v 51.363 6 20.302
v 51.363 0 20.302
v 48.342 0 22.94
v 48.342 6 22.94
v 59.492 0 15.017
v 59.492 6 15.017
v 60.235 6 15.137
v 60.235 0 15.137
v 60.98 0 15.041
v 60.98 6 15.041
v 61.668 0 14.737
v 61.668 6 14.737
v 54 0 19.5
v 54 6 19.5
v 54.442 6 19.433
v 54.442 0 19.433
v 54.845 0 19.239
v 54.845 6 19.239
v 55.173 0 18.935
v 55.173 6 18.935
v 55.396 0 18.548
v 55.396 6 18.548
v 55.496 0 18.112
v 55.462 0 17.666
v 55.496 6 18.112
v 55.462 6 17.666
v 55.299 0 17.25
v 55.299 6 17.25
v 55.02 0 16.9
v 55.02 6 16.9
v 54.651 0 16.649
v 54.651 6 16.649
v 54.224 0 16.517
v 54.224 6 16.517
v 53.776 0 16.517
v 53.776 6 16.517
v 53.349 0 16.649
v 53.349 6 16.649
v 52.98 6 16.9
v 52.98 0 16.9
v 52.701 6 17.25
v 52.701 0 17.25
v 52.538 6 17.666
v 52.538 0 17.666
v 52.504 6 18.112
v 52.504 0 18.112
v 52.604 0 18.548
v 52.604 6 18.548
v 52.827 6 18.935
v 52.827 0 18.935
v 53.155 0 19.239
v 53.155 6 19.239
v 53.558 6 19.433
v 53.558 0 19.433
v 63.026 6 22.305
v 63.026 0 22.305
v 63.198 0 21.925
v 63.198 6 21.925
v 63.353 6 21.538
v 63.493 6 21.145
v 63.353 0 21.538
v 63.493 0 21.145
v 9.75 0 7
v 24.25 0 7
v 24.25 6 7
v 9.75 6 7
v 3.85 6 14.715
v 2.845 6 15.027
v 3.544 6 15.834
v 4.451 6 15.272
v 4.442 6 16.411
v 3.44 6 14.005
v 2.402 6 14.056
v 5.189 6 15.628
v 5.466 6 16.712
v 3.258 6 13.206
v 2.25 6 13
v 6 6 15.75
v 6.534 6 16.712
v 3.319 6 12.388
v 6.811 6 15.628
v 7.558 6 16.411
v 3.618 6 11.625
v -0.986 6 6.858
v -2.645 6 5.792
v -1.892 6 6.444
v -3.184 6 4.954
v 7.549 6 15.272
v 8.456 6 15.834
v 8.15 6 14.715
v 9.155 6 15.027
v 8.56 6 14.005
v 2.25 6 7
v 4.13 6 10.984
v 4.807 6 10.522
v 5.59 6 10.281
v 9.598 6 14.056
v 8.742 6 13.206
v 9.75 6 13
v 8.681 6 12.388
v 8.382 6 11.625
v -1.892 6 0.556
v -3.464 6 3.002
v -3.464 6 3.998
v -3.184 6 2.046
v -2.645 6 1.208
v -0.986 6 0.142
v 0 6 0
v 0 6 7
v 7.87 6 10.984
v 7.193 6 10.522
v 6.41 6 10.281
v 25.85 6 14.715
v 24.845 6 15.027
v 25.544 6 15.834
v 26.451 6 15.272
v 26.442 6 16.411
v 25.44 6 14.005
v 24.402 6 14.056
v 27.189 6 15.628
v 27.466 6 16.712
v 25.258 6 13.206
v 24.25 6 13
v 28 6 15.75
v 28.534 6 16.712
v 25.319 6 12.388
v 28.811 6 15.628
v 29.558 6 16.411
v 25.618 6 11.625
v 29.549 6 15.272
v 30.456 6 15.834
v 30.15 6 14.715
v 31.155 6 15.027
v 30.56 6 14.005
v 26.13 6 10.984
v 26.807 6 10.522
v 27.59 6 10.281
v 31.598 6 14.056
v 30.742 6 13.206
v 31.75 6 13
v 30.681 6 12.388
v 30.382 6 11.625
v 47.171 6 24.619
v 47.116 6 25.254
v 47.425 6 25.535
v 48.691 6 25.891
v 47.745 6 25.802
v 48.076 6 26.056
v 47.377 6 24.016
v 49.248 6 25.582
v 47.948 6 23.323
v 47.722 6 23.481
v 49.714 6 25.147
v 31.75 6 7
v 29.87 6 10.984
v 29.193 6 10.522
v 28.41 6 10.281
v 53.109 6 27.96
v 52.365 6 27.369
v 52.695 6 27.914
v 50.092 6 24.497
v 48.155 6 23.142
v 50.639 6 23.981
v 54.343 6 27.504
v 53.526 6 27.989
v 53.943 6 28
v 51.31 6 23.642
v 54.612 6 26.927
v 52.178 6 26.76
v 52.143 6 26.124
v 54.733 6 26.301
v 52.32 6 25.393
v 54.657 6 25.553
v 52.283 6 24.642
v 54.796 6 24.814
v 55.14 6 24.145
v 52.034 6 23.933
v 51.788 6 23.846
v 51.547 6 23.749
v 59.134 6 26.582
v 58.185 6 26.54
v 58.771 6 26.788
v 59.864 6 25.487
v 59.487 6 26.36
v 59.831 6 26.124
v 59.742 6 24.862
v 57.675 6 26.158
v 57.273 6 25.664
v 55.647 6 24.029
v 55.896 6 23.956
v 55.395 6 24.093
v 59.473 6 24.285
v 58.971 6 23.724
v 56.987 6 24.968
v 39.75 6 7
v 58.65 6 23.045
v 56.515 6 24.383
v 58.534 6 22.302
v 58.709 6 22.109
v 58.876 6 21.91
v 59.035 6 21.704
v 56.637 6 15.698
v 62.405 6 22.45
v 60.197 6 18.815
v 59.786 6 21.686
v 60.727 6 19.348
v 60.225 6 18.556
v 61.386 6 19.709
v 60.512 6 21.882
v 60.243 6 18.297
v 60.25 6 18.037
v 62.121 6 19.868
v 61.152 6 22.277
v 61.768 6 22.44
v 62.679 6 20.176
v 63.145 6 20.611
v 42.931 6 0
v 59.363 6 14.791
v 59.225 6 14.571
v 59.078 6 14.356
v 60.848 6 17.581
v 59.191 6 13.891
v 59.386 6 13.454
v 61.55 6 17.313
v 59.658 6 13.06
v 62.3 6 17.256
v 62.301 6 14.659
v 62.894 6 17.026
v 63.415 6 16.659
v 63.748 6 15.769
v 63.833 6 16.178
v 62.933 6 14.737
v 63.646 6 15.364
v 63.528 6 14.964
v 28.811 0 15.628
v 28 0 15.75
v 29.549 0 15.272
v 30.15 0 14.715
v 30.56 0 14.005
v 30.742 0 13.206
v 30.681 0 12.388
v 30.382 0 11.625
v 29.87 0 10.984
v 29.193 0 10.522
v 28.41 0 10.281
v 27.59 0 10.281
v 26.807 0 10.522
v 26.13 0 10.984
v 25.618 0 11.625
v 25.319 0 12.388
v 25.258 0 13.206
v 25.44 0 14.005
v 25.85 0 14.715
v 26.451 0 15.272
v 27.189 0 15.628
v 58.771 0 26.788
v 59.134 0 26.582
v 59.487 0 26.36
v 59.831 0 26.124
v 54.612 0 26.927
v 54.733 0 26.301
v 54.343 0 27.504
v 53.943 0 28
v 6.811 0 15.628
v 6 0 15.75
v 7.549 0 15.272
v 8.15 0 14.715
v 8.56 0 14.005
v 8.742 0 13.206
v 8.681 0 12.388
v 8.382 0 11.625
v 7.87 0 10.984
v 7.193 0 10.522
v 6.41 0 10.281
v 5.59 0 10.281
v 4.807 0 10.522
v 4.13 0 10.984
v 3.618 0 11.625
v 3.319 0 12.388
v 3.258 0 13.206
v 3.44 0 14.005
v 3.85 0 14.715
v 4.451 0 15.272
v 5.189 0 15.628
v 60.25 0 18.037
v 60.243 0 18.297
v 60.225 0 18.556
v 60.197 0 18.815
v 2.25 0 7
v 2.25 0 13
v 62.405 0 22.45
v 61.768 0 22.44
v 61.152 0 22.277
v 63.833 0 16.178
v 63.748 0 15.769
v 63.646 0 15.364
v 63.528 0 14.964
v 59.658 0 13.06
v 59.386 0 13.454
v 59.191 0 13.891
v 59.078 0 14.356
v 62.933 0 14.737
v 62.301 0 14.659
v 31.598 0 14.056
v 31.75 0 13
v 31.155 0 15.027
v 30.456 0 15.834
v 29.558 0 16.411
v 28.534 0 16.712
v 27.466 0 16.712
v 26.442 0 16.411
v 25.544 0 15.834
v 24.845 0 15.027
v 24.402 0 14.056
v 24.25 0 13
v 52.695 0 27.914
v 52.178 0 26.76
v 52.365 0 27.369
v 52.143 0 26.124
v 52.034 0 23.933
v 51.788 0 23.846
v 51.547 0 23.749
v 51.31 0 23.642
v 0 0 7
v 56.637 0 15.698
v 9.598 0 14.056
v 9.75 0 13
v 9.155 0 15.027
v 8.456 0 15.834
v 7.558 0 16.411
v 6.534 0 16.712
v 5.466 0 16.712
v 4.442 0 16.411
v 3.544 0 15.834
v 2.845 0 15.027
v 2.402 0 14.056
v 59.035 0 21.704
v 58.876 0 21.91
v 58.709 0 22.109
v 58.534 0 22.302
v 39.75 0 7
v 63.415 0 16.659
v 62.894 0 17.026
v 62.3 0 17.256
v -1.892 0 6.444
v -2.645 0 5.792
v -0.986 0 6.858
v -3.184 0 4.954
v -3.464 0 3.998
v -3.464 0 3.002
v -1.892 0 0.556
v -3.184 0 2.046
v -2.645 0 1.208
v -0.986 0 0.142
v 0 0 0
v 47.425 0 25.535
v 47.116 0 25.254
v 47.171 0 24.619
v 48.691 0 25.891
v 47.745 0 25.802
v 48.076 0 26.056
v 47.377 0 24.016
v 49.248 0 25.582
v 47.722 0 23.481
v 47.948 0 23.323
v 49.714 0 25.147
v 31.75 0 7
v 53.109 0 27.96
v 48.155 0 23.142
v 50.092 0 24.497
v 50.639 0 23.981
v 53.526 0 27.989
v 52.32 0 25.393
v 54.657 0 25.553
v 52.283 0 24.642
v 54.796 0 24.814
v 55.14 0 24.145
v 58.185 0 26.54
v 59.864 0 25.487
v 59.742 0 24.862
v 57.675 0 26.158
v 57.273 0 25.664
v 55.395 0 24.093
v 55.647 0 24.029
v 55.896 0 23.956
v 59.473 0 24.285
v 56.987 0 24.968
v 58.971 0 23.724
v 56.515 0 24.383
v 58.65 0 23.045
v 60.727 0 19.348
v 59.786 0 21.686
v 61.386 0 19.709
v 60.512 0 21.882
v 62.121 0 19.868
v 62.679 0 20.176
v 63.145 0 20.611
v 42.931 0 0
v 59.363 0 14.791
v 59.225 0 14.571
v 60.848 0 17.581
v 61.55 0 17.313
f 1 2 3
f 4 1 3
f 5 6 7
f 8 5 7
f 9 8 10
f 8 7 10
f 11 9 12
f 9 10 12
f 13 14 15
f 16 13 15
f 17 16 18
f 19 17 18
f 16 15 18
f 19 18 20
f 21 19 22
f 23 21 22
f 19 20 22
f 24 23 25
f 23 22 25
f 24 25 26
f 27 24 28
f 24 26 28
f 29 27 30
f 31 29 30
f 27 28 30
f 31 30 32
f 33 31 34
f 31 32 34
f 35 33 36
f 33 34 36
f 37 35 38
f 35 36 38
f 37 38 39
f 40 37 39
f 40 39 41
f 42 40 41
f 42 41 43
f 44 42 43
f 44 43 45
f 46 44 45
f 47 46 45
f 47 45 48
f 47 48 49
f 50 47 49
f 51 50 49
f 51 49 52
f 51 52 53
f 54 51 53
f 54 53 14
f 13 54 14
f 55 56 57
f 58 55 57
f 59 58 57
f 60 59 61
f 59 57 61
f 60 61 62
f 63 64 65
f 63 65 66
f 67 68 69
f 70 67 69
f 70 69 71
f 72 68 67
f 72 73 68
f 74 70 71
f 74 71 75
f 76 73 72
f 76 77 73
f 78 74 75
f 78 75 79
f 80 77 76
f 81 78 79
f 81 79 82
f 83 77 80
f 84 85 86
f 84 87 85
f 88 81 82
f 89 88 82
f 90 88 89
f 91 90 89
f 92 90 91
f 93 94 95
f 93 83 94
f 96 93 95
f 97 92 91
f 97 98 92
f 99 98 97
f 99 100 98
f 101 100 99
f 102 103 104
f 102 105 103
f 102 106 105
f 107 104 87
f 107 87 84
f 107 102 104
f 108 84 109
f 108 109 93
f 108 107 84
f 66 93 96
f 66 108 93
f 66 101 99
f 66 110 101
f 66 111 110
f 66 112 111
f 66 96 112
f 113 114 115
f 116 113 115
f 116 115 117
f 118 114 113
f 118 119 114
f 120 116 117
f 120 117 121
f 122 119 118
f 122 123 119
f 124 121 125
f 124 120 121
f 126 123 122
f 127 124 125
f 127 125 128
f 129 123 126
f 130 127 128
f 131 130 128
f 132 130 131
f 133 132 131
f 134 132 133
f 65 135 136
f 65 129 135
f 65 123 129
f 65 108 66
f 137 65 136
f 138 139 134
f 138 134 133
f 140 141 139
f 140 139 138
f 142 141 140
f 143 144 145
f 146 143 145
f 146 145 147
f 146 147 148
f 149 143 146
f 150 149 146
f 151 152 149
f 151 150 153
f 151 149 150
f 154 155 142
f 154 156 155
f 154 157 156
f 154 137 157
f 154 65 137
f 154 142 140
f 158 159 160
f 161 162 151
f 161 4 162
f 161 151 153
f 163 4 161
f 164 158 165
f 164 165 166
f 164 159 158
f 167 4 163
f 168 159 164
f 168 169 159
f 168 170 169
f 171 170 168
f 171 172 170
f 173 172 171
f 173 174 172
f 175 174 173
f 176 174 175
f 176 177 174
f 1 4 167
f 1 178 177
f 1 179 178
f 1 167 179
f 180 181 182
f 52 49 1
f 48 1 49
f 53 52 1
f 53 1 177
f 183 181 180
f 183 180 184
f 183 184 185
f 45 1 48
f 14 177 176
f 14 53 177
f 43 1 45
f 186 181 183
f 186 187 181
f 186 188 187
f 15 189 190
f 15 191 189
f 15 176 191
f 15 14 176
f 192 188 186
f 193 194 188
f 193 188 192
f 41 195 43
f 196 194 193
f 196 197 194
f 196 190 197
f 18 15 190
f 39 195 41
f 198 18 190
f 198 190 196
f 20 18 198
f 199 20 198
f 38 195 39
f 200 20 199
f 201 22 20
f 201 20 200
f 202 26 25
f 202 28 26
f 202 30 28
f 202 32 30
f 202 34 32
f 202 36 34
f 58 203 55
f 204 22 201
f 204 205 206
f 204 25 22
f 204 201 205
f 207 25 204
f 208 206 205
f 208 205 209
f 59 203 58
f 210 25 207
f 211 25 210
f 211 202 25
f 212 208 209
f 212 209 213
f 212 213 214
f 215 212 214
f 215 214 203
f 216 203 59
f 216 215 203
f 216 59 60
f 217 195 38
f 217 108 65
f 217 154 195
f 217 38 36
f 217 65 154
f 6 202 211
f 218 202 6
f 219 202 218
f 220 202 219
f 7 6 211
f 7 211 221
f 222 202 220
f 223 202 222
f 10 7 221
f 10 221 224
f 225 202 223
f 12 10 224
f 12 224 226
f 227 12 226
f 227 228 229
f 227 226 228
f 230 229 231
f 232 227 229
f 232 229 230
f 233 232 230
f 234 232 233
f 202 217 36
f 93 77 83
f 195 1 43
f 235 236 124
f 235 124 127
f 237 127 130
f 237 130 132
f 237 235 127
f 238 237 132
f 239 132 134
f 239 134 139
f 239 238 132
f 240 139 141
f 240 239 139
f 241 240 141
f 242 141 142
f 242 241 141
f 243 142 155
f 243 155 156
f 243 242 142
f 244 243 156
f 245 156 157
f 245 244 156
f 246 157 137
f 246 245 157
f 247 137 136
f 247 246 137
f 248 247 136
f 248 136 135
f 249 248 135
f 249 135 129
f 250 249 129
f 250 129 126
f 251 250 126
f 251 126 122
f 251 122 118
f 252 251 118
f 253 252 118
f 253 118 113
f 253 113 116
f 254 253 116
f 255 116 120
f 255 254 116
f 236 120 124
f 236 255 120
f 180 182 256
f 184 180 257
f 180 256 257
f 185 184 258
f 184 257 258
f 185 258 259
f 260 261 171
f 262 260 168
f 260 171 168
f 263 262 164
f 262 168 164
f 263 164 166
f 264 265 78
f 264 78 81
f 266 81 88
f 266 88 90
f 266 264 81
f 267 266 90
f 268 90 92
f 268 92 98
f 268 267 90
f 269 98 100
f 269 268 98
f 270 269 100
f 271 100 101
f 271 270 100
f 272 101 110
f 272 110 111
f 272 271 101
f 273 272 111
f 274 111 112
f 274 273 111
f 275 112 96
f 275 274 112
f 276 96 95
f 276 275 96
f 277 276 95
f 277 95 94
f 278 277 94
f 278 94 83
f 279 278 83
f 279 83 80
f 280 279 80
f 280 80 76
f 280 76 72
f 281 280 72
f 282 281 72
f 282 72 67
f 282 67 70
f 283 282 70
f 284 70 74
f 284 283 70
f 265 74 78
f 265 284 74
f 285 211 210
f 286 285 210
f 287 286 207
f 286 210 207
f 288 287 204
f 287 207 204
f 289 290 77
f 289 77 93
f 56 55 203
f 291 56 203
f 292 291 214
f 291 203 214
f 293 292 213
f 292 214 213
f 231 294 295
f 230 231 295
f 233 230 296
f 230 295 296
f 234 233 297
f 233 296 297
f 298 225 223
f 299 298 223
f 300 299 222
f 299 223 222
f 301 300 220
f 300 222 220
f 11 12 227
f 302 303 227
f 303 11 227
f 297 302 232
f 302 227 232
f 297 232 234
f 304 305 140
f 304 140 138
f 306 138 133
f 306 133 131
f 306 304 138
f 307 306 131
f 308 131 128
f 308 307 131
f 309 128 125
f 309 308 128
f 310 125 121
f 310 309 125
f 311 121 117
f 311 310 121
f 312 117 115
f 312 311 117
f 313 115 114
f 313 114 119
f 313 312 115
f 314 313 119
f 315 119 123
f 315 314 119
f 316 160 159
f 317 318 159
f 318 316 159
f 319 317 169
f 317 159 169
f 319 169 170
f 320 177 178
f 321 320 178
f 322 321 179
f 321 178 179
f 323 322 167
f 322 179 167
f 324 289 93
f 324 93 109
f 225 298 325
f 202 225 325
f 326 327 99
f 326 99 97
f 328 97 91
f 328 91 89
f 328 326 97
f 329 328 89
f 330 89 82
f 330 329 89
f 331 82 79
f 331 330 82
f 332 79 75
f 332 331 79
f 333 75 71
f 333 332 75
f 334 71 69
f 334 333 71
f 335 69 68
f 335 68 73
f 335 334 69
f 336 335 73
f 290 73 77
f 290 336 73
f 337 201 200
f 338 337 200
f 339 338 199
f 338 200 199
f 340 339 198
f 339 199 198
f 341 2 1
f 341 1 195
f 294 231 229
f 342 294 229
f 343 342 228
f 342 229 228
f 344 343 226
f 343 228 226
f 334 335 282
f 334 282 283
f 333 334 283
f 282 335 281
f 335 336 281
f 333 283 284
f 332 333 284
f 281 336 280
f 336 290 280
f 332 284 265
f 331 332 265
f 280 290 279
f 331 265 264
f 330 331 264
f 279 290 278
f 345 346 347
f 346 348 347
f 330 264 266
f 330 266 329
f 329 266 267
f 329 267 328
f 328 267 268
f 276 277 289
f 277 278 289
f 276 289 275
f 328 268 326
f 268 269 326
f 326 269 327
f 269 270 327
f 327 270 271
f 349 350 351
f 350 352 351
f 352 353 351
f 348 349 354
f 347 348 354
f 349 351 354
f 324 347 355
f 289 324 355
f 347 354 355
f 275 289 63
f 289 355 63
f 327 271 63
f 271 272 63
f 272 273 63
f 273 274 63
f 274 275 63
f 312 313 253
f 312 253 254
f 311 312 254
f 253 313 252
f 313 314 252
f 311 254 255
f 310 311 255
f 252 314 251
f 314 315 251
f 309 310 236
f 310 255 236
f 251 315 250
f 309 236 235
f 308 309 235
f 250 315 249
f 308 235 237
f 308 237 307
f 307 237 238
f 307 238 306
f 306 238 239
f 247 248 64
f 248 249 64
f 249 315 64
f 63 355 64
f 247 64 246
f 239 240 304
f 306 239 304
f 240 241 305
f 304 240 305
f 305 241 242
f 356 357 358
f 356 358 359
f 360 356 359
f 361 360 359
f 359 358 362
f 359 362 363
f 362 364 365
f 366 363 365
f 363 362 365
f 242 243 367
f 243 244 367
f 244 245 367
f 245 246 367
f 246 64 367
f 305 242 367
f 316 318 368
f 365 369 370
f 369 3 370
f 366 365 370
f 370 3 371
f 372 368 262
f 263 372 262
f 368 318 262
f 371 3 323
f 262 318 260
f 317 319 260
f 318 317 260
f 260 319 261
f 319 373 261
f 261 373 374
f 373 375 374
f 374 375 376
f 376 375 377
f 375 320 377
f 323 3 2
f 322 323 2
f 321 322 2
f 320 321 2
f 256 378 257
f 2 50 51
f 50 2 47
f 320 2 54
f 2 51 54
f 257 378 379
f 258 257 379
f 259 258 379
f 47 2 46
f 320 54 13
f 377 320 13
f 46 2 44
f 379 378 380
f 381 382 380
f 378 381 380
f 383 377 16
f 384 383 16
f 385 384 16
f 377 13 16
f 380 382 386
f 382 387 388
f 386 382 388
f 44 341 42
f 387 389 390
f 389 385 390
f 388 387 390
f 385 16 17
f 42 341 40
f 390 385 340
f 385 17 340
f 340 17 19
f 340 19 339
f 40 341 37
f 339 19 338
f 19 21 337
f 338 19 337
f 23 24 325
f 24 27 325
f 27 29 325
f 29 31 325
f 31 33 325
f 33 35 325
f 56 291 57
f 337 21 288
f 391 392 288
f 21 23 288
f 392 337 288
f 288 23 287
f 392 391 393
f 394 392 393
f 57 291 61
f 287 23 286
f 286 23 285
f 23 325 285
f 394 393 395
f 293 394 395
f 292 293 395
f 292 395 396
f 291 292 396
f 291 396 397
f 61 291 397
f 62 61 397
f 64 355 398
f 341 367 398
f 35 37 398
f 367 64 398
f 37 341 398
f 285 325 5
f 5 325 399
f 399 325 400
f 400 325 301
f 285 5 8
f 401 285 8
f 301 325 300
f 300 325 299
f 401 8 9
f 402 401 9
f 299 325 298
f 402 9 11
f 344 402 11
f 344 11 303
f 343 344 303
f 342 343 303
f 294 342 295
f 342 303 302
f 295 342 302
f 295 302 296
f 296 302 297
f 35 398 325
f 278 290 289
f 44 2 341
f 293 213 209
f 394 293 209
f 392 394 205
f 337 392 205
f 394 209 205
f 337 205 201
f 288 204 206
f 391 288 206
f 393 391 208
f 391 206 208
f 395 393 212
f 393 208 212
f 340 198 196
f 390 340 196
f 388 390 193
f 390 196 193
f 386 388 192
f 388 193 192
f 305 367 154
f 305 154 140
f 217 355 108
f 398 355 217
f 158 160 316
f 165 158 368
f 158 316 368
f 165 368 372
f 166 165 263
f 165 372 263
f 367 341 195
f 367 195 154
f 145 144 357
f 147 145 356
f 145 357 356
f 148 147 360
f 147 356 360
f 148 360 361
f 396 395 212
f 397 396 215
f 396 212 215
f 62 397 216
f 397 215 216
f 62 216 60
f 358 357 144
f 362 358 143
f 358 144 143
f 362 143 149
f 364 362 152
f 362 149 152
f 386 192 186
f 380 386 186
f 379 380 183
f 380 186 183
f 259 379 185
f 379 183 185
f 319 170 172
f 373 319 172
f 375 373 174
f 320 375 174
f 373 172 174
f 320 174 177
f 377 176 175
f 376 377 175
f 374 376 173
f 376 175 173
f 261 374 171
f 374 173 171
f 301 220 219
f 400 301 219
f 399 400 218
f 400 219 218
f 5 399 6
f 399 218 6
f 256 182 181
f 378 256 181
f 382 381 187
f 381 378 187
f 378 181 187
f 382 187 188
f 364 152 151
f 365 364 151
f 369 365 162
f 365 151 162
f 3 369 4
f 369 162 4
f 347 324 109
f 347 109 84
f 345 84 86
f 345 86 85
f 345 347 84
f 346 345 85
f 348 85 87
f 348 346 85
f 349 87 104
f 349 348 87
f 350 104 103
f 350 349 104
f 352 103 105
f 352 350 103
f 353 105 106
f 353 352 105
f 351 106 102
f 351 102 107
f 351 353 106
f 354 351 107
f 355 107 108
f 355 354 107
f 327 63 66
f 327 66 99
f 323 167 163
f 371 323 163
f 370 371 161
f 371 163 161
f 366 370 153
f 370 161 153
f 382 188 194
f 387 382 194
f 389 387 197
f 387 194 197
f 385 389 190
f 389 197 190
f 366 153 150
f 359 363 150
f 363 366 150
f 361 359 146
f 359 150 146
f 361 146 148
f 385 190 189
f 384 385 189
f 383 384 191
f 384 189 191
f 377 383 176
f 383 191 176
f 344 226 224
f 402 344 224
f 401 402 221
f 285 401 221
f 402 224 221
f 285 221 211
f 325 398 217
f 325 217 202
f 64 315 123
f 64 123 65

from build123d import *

# Parameters (mm, degrees)
CROQUIS1_R              = 2.75
SALIENTE_EXTRUIR1_DEPTH = 6
CROQUIS2_R              = 1.5
CORTAR_EXTRUIR1_DEPTH   = 62.68062905
SALIENTE_EXTRUIR2_START = -6
SALIENTE_EXTRUIR2_DEPTH = 6
CORTAR_EXTRUIR2_DEPTH   = 71.114192572


with BuildPart() as part:
    # Croquis1 → Saliente-Extruir1 (new body)
    with BuildSketch(Plane(origin=(0, 0, 0), x_dir=(1, 0, 0), z_dir=(0, 1, 0))):
        with BuildLine():
            Line((42.930999161, 0), (56.636539912, -15.69811875))
            ThreePointArc((56.636539912, -15.69811875), (56.30188125, -20.636539912), (51.363460088, -20.30188125))
            Line((51.363460088, -20.30188125), (39.75, -7))
            Line((39.75, -7), (31.75, -7))
            Line((31.75, -7), (31.75, -13))
            ThreePointArc((31.75, -13), (28, -16.75), (24.25, -13))
            Line((24.25, -13), (24.25, -7))
            Line((24.25, -7), (9.75, -7))
            Line((9.75, -7), (9.75, -13))
            ThreePointArc((9.75, -13), (6, -16.75), (2.25, -13))
            Line((2.25, -13), (2.25, -7))
            Line((2.25, -7), (0, -7))
            ThreePointArc((0, -7), (-3.5, -3.5), (0, 0))
            Line((0, 0), (42.930999161, 0))
        make_face()
        with Locations(Location((28, -13, 0), (0, 0, 270))):
            Circle(CROQUIS1_R, mode=Mode.SUBTRACT)
        with Locations(Location((6, -13, 0), (0, 0, 270))):
            Circle(CROQUIS1_R, mode=Mode.SUBTRACT)
    extrude(amount=SALIENTE_EXTRUIR1_DEPTH)

    # Croquis2 → Cortar-Extruir1 (cut, through all)
    with BuildSketch(Plane(origin=(0, 6, 0), x_dir=(1, 0, 0), z_dir=(0, 1, 0))):
        with Locations(Location((54, -18, 0), (0, 0, 270))):
            Circle(CROQUIS2_R)
    extrude(amount=-CORTAR_EXTRUIR1_DEPTH, mode=Mode.SUBTRACT)

    # Croquis3 → Saliente-Extruir2 (add)
    with BuildSketch(Plane(origin=(0, 6, 0), x_dir=(1, 0, 0), z_dir=(0, 1, 0)).offset(SALIENTE_EXTRUIR2_START)):
        with BuildLine():
            Line((51.363460088, -20.30188125), (46.467028822, -24.576803572))
            ThreePointArc((46.467028822, -24.576803572), (60.576803572, -25.532971178), (61.532971178, -11.423196428))
            Line((61.532971178, -11.423196428), (56.636539912, -15.69811875))
            ThreePointArc((56.636539912, -15.69811875), (56.30188125, -20.636539912), (51.363460088, -20.30188125))
        make_face()
    extrude(amount=SALIENTE_EXTRUIR2_DEPTH)

    # Croquis4 → Cortar-Extruir2 (cut, through all)
    with BuildSketch(Plane(origin=(0, 6, 0), x_dir=(1, 0, 0), z_dir=(0, 1, 0))):
        with BuildLine():
            ThreePointArc((44.471919223, -21.035733308), (45.527460474, -23.311880456), (47.116349204, -25.25364403))
            ThreePointArc((47.116349204, -25.25364403), (47.255351375, -24.311140987), (47.722398468, -23.480779257))
            ThreePointArc((47.722398468, -23.480779257), (48.523826653, -22.694010434), (48.921868449, -21.643841379))
            ThreePointArc((48.921868449, -21.643841379), (48.704493345, -21.320031523), (48.507736999, -20.983294683))
            ThreePointArc((48.507736999, -20.983294683), (47.389059112, -20.884036937), (46.331721606, -21.262626046))
            ThreePointArc((46.331721606, -21.262626046), (45.380828681, -21.321245459), (44.471919223, -21.035733308))
        make_face()
        with BuildLine():
            ThreePointArc((48.075979996, -26.056425199), (50.267816532, -27.277435344), (52.694594509, -27.914429711))
            ThreePointArc((52.694594509, -27.914429711), (52.253060238, -27.070225306), (52.142834895, -26.123925161))
            ThreePointArc((52.142834895, -26.123925161), (52.328752805, -25.016348145), (52.0335015, -23.932780435))
            ThreePointArc((52.0335015, -23.932780435), (51.667310689, -23.798582639), (51.310202513, -23.641807292))
            ThreePointArc((51.310202513, -23.641807292), (50.346830851, -24.219048452), (49.713955935, -25.146820868))
            ThreePointArc((49.713955935, -25.146820868), (48.979123025, -25.753165807), (48.075979996, -26.056425199))
        make_face()
        with BuildLine():
            ThreePointArc((53.94281506, -27.999836493), (56.433739822, -27.699325259), (58.771460342, -26.788240222))
            ThreePointArc((58.771460342, -26.788240222), (57.918040714, -26.364791844), (57.272645269, -25.664007776))
            ThreePointArc((57.272645269, -25.664007776), (56.772038582, -24.658679342), (55.896270139, -23.955599013))
            ThreePointArc((55.896270139, -23.955599013), (55.521136064, -24.062272273), (55.140079244, -24.145341273))
            ThreePointArc((55.140079244, -24.145341273), (54.699989039, -25.178594837), (54.73331342, -26.30117303))
            ThreePointArc((54.73331342, -26.30117303), (54.495221721, -27.223640338), (53.94281506, -27.999836493))
        make_face()
        with BuildLine():
            ThreePointArc((59.831492828, -26.123650128), (61.670057221, -24.416402593), (63.025790501, -22.305241669))
            ThreePointArc((63.025790501, -22.305241669), (62.086462807, -22.464292206), (61.152416384, -22.276699911))
            ThreePointArc((61.152416384, -22.276699911), (60.156499839, -21.75762135), (59.034728037, -21.703581191))
            ThreePointArc((59.034728037, -21.703581191), (58.793939164, -22.010379949), (58.534484453, -22.30156376))
            ThreePointArc((58.534484453, -22.30156376), (58.785775205, -23.396161985), (59.472570103, -24.284759241))
            ThreePointArc((59.472570103, -24.284759241), (59.822162551, -25.170997759), (59.831492828, -26.123650128))
        make_face()
        with BuildLine():
            ThreePointArc((63.49273854, -21.144505527), (63.976673456, -18.682632222), (63.832575464, -16.177787128))
            ThreePointArc((63.832575464, -16.177787128), (63.166130956, -16.858584682), (62.300207541, -17.255838039))
            ThreePointArc((62.300207541, -17.255838039), (61.189387409, -17.42127972), (60.250090948, -18.036921234))
            ThreePointArc((60.250090948, -18.036921234), (60.235620444, -18.426658791), (60.196870723, -18.814735096))
            ThreePointArc((60.196870723, -18.814735096), (61.043557906, -19.552578664), (62.121491012, -19.867781033))
            ThreePointArc((62.121491012, -19.867781033), (62.925235175, -20.379277769), (63.49273854, -21.144505527))
        make_face()
        with BuildLine():
            ThreePointArc((63.528080777, -14.964266692), (62.472539526, -12.688119544), (60.883650796, -10.74635597))
            ThreePointArc((60.883650796, -10.74635597), (60.744648625, -11.688859013), (60.277601532, -12.519220743))
            ThreePointArc((60.277601532, -12.519220743), (59.476173347, -13.305989566), (59.078131551, -14.356158621))
            ThreePointArc((59.078131551, -14.356158621), (59.295506655, -14.679968477), (59.492263001, -15.016705317))
            ThreePointArc((59.492263001, -15.016705317), (60.610940888, -15.115963063), (61.668278394, -14.737373954))
            ThreePointArc((61.668278394, -14.737373954), (62.619171319, -14.678754541), (63.528080777, -14.964266692))
        make_face()
    extrude(amount=-CORTAR_EXTRUIR2_DEPTH, mode=Mode.SUBTRACT)


solid = part.part
